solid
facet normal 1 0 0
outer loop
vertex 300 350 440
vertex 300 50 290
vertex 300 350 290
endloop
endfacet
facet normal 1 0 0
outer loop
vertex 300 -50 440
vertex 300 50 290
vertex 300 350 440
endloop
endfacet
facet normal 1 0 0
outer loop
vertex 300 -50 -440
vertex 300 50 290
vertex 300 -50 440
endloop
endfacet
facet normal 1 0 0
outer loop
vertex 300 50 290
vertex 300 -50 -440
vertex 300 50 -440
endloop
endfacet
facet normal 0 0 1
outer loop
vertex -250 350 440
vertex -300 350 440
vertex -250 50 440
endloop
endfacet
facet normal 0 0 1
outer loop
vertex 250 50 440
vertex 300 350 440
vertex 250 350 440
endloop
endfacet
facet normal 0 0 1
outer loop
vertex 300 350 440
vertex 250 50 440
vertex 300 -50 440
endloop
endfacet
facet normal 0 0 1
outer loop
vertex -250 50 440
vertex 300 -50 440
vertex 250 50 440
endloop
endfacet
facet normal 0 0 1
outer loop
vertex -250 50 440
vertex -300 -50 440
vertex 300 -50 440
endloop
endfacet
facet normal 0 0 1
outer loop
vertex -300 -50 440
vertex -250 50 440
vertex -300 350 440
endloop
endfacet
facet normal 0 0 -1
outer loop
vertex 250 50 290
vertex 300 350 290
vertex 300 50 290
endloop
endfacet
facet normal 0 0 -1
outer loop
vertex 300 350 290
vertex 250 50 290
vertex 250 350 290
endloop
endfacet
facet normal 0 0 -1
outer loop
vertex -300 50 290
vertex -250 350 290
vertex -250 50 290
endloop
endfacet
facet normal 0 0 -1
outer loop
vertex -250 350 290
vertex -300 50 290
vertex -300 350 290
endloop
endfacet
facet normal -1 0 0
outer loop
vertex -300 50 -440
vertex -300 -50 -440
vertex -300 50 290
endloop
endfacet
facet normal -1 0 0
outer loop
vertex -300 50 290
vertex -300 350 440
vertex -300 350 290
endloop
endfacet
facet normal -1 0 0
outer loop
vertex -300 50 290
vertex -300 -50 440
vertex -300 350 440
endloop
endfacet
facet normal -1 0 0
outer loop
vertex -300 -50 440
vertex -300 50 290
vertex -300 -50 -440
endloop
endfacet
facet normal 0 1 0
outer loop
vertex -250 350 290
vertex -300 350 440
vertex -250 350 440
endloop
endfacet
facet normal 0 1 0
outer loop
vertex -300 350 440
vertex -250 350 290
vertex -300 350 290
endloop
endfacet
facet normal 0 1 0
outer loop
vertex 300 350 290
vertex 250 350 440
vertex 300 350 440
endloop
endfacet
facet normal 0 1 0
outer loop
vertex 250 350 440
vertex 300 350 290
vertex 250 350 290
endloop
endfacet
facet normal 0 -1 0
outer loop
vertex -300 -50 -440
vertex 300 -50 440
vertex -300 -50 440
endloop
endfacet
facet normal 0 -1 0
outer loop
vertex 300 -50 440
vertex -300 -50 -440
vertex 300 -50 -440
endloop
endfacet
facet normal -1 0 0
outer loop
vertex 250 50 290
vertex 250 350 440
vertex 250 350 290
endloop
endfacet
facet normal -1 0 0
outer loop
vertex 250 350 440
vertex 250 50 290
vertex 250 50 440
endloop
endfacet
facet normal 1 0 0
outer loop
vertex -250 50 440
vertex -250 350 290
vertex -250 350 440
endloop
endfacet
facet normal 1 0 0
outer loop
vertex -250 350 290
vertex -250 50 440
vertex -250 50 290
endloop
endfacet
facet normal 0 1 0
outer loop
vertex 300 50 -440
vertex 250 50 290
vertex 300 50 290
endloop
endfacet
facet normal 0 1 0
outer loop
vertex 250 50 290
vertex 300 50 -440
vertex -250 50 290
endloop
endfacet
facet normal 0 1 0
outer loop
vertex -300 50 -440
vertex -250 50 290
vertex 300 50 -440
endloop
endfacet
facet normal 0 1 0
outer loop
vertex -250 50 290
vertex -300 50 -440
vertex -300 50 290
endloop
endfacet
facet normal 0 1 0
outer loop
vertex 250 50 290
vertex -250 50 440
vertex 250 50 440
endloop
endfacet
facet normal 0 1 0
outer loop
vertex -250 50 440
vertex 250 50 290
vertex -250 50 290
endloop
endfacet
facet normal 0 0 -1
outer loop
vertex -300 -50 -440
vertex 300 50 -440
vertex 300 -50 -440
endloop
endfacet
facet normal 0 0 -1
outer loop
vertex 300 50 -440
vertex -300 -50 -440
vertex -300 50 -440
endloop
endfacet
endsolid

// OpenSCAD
// all dimensions are in mm
// structure is: declaration, variables, calls

//declarations:
module main_chassis(mcha_width = 600, mcha_height = 880, mcha_thickness = 100, head_space = 600, head_depth=400, head_sides_tallness= 150) {
	difference() {
		union(){
			cube([mcha_width,mcha_thickness, mcha_height]);
			translate([(mcha_width/2) - (head_space/2), 0, mcha_height - head_sides_tallness]) {
				difference() {
					cube([head_space, head_depth, head_sides_tallness]);
					translate([mcha_thickness/2, mcha_thickness * 1,0]) {
						cube([head_space -mcha_thickness, (head_depth-(mcha_thickness)), head_sides_tallness]);
					}
				}
			}
		}

	}
}

//vars:
	main_chassis_width = 600;
	main_chassis_thickness = 100;
	main_chassis_height = 880;

//calls:
translate([-main_chassis_width/2, -main_chassis_thickness/2, -main_chassis_height/2]) {
	main_chassis(main_chassis_width, main_chassis_height, main_chassis_thickness);
}
